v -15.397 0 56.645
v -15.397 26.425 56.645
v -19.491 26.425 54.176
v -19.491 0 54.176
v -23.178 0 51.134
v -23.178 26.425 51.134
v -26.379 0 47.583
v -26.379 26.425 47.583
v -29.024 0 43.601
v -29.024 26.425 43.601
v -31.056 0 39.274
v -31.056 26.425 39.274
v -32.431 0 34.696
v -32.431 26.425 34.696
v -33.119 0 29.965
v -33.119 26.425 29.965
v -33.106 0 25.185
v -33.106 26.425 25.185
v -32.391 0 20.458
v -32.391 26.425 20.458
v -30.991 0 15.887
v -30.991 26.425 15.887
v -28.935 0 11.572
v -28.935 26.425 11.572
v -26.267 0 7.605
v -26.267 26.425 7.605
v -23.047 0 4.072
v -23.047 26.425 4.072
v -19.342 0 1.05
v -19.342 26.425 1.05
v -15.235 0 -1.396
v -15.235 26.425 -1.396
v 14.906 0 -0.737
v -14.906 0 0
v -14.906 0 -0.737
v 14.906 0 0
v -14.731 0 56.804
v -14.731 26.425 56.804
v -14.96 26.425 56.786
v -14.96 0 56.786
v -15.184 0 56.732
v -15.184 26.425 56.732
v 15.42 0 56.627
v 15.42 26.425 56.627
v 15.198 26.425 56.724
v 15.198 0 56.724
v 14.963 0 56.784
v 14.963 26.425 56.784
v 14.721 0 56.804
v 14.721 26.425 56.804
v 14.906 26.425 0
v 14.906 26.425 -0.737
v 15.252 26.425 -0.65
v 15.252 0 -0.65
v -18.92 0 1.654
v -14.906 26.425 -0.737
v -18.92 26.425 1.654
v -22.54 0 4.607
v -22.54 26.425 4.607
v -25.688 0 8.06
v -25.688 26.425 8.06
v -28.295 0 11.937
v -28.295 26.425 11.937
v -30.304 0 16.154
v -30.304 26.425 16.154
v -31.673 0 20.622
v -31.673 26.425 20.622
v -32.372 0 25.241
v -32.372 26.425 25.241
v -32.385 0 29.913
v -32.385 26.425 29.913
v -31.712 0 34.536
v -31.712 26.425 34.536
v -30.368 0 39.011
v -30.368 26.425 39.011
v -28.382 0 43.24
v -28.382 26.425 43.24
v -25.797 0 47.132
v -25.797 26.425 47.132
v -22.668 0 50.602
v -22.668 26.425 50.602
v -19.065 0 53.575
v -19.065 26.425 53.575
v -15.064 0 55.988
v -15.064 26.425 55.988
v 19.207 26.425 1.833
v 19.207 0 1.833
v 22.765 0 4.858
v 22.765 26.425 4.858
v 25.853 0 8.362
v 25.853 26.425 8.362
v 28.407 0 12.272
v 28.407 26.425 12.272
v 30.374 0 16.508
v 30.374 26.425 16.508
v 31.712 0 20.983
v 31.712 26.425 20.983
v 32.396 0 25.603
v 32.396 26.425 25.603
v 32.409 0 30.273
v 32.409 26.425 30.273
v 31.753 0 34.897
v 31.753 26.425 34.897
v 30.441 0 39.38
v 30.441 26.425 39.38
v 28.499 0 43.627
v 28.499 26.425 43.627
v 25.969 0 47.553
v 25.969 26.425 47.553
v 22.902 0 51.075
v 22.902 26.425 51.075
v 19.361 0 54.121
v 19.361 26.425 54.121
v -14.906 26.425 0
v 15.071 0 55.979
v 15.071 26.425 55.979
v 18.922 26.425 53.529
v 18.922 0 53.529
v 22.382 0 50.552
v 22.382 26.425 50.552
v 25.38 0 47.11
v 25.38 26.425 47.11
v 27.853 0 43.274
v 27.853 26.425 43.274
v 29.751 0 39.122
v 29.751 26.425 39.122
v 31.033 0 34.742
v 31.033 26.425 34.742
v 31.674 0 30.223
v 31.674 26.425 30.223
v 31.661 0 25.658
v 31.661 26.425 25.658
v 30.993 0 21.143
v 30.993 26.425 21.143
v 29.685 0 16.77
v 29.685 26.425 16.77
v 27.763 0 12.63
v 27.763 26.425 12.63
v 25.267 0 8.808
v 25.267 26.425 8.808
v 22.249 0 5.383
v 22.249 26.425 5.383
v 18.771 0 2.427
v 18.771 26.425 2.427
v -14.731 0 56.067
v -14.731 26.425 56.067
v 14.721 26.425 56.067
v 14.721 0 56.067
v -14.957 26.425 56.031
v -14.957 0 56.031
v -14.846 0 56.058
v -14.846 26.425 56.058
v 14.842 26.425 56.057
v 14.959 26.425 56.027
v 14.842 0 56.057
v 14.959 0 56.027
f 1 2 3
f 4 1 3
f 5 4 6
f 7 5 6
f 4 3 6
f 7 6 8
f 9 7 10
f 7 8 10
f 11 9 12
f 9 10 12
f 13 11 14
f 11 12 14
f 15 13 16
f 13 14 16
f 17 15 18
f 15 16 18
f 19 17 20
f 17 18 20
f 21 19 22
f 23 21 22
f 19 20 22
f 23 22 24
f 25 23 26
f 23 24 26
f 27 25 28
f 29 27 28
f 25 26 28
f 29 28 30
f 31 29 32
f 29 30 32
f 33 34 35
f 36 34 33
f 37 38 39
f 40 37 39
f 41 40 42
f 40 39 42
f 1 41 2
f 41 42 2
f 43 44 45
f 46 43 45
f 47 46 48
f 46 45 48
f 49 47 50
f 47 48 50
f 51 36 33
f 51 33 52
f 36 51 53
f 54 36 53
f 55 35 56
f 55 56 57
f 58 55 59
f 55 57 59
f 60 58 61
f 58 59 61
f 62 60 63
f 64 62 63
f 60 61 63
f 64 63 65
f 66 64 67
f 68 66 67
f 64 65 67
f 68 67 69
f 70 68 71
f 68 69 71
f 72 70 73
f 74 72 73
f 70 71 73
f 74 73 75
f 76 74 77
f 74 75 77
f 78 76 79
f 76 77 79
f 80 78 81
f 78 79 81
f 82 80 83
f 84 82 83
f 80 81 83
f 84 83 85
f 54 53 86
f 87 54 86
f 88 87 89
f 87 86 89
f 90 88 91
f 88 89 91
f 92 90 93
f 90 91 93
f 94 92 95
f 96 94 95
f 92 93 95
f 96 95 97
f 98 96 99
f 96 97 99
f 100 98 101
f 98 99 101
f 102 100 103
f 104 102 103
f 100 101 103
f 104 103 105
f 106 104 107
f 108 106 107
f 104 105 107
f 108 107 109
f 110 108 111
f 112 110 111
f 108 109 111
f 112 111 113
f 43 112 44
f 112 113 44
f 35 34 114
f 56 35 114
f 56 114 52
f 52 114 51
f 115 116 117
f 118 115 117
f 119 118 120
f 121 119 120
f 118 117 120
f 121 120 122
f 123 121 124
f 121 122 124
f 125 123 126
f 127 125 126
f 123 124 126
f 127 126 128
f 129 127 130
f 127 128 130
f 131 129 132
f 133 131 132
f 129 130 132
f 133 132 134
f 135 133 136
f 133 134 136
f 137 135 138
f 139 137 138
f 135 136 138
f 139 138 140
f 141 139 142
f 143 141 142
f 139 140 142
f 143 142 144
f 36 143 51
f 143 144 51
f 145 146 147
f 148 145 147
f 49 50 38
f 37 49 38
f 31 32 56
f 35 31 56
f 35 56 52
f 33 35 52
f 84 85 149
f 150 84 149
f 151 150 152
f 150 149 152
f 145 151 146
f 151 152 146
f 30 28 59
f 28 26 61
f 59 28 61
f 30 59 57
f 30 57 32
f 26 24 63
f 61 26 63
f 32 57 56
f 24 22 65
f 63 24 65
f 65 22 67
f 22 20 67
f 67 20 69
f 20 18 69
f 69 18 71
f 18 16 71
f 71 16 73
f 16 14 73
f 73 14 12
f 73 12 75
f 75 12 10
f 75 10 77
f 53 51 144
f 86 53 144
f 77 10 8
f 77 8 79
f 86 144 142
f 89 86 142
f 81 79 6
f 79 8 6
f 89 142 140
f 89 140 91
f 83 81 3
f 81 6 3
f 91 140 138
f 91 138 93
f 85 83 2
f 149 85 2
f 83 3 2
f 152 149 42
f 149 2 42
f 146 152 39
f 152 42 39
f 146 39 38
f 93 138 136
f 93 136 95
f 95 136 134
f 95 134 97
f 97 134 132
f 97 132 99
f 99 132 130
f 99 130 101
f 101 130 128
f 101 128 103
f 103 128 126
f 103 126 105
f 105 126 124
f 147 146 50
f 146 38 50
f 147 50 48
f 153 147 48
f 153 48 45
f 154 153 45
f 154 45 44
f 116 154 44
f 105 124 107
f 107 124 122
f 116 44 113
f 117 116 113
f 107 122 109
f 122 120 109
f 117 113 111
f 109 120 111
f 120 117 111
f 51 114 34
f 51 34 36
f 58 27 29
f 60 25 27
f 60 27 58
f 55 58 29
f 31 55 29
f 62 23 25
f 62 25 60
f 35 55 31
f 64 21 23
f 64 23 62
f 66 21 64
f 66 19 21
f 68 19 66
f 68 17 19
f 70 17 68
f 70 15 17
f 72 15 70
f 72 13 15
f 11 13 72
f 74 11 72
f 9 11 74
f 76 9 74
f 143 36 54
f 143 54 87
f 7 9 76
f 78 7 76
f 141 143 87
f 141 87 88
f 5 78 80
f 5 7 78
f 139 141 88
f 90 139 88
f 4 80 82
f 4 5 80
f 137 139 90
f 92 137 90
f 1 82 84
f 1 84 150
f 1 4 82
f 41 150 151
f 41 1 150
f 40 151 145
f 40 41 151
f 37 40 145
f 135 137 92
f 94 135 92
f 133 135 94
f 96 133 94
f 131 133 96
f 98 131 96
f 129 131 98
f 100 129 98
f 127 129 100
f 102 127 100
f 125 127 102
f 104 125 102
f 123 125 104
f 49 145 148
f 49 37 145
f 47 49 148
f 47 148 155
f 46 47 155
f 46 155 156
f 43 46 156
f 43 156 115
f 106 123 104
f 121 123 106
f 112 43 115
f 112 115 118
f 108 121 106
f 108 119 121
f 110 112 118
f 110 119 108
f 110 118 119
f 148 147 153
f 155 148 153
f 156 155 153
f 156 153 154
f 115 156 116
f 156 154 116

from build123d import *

# Parameters (mm, degrees)
SKETCH1_W          = 29.811444236
SKETCH1_H          = 26.425
BASE_FLANGE1_DEPTH = 0.7366
BASE_FLANGE2_START = -26.425
BASE_FLANGE2_DEPTH = 26.425


# Read off the part's stored shape, not the designer's step: Base-Flange2
# Sheet-metal steps are written as plain solids
with BuildPart() as part:
    # Sketch1 → Base-Flange1 (new body)
    with BuildSketch(Plane.XY):
        with Locations((0, 13.2125)):
            Rectangle(SKETCH1_W, SKETCH1_H)
    extrude(amount=-BASE_FLANGE1_DEPTH)


with BuildPart() as body_2:
    # Base-Flange2 outline → Base-Flange2 (new body)
    with BuildSketch(Plane.XZ.offset(BASE_FLANGE2_START)):
        with BuildLine():
            ThreePointArc((-14.730861876, 56.803772147), (-15.073134478, 56.763460037), (-15.396675433, 56.64472988))
            ThreePointArc((-15.396675433, 56.64472988), (-33.200812457, 27.574771442), (-15.234962217, -1.395523757))
            Line((-15.234962217, -1.395523757), (-14.905722118, -0.7366))
            ThreePointArc((-14.905722118, -0.7366), (-32.464215316, 27.576823767), (-15.063768654, 55.987651013))
            ThreePointArc((-15.063768654, 55.987651013), (-14.901998177, 56.047016092), (-14.730861876, 56.067172147))
            Line((-14.730861876, 56.067172147), (14.720921536, 56.067172147))
            ThreePointArc((14.720921536, 56.067172147), (14.901224998, 56.044764153), (15.070558493, 55.978903511))
            ThreePointArc((15.070558493, 55.978903511), (31.749862353, 27.940094921), (14.905722118, 0))
            Line((14.905722118, 0), (15.251534872, -0.650379197))
            ThreePointArc((15.251534872, -0.650379197), (32.486459159, 27.937925926), (15.42019545, 56.627234876))
            ThreePointArc((15.42019545, 56.627234876), (15.08152846, 56.758956159), (14.720921536, 56.803772147))
            Line((14.720921536, 56.803772147), (-14.730861876, 56.803772147))
        make_face()
    extrude(amount=BASE_FLANGE2_DEPTH)


solid = Compound([part.part, body_2.part])
